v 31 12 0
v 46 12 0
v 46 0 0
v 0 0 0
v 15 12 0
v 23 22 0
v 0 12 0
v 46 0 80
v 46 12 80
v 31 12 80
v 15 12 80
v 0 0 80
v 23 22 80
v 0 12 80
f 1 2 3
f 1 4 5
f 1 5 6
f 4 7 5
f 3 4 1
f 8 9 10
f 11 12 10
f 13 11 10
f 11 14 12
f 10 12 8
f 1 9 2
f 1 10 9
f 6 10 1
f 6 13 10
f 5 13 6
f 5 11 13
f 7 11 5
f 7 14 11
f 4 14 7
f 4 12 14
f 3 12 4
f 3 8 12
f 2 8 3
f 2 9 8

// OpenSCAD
$fn = 32;

// ----------------------------------------------------------------------
// V guide rail: vrib, 46 mm wide
// ----------------------------------------------------------------------

// --- parameters (mm) ---
rail_w = 46;              // rail width, X
base_t = 12;              // base plate thickness
v_depth = 10;             // V feature depth / height
v_half_w = 8;             // half width of the V at the base face
plate_t = 80;             // rail length, Z (the extrusion height)

profile = [[0, 0], [46, 0], [46, 12], [31, 12], [23, 22], [15, 12], [0, 12]];  // primary outline, 7 points, counter clockwise

// --- the one profile operation ---
linear_extrude(height = plate_t) polygon(points = profile);
